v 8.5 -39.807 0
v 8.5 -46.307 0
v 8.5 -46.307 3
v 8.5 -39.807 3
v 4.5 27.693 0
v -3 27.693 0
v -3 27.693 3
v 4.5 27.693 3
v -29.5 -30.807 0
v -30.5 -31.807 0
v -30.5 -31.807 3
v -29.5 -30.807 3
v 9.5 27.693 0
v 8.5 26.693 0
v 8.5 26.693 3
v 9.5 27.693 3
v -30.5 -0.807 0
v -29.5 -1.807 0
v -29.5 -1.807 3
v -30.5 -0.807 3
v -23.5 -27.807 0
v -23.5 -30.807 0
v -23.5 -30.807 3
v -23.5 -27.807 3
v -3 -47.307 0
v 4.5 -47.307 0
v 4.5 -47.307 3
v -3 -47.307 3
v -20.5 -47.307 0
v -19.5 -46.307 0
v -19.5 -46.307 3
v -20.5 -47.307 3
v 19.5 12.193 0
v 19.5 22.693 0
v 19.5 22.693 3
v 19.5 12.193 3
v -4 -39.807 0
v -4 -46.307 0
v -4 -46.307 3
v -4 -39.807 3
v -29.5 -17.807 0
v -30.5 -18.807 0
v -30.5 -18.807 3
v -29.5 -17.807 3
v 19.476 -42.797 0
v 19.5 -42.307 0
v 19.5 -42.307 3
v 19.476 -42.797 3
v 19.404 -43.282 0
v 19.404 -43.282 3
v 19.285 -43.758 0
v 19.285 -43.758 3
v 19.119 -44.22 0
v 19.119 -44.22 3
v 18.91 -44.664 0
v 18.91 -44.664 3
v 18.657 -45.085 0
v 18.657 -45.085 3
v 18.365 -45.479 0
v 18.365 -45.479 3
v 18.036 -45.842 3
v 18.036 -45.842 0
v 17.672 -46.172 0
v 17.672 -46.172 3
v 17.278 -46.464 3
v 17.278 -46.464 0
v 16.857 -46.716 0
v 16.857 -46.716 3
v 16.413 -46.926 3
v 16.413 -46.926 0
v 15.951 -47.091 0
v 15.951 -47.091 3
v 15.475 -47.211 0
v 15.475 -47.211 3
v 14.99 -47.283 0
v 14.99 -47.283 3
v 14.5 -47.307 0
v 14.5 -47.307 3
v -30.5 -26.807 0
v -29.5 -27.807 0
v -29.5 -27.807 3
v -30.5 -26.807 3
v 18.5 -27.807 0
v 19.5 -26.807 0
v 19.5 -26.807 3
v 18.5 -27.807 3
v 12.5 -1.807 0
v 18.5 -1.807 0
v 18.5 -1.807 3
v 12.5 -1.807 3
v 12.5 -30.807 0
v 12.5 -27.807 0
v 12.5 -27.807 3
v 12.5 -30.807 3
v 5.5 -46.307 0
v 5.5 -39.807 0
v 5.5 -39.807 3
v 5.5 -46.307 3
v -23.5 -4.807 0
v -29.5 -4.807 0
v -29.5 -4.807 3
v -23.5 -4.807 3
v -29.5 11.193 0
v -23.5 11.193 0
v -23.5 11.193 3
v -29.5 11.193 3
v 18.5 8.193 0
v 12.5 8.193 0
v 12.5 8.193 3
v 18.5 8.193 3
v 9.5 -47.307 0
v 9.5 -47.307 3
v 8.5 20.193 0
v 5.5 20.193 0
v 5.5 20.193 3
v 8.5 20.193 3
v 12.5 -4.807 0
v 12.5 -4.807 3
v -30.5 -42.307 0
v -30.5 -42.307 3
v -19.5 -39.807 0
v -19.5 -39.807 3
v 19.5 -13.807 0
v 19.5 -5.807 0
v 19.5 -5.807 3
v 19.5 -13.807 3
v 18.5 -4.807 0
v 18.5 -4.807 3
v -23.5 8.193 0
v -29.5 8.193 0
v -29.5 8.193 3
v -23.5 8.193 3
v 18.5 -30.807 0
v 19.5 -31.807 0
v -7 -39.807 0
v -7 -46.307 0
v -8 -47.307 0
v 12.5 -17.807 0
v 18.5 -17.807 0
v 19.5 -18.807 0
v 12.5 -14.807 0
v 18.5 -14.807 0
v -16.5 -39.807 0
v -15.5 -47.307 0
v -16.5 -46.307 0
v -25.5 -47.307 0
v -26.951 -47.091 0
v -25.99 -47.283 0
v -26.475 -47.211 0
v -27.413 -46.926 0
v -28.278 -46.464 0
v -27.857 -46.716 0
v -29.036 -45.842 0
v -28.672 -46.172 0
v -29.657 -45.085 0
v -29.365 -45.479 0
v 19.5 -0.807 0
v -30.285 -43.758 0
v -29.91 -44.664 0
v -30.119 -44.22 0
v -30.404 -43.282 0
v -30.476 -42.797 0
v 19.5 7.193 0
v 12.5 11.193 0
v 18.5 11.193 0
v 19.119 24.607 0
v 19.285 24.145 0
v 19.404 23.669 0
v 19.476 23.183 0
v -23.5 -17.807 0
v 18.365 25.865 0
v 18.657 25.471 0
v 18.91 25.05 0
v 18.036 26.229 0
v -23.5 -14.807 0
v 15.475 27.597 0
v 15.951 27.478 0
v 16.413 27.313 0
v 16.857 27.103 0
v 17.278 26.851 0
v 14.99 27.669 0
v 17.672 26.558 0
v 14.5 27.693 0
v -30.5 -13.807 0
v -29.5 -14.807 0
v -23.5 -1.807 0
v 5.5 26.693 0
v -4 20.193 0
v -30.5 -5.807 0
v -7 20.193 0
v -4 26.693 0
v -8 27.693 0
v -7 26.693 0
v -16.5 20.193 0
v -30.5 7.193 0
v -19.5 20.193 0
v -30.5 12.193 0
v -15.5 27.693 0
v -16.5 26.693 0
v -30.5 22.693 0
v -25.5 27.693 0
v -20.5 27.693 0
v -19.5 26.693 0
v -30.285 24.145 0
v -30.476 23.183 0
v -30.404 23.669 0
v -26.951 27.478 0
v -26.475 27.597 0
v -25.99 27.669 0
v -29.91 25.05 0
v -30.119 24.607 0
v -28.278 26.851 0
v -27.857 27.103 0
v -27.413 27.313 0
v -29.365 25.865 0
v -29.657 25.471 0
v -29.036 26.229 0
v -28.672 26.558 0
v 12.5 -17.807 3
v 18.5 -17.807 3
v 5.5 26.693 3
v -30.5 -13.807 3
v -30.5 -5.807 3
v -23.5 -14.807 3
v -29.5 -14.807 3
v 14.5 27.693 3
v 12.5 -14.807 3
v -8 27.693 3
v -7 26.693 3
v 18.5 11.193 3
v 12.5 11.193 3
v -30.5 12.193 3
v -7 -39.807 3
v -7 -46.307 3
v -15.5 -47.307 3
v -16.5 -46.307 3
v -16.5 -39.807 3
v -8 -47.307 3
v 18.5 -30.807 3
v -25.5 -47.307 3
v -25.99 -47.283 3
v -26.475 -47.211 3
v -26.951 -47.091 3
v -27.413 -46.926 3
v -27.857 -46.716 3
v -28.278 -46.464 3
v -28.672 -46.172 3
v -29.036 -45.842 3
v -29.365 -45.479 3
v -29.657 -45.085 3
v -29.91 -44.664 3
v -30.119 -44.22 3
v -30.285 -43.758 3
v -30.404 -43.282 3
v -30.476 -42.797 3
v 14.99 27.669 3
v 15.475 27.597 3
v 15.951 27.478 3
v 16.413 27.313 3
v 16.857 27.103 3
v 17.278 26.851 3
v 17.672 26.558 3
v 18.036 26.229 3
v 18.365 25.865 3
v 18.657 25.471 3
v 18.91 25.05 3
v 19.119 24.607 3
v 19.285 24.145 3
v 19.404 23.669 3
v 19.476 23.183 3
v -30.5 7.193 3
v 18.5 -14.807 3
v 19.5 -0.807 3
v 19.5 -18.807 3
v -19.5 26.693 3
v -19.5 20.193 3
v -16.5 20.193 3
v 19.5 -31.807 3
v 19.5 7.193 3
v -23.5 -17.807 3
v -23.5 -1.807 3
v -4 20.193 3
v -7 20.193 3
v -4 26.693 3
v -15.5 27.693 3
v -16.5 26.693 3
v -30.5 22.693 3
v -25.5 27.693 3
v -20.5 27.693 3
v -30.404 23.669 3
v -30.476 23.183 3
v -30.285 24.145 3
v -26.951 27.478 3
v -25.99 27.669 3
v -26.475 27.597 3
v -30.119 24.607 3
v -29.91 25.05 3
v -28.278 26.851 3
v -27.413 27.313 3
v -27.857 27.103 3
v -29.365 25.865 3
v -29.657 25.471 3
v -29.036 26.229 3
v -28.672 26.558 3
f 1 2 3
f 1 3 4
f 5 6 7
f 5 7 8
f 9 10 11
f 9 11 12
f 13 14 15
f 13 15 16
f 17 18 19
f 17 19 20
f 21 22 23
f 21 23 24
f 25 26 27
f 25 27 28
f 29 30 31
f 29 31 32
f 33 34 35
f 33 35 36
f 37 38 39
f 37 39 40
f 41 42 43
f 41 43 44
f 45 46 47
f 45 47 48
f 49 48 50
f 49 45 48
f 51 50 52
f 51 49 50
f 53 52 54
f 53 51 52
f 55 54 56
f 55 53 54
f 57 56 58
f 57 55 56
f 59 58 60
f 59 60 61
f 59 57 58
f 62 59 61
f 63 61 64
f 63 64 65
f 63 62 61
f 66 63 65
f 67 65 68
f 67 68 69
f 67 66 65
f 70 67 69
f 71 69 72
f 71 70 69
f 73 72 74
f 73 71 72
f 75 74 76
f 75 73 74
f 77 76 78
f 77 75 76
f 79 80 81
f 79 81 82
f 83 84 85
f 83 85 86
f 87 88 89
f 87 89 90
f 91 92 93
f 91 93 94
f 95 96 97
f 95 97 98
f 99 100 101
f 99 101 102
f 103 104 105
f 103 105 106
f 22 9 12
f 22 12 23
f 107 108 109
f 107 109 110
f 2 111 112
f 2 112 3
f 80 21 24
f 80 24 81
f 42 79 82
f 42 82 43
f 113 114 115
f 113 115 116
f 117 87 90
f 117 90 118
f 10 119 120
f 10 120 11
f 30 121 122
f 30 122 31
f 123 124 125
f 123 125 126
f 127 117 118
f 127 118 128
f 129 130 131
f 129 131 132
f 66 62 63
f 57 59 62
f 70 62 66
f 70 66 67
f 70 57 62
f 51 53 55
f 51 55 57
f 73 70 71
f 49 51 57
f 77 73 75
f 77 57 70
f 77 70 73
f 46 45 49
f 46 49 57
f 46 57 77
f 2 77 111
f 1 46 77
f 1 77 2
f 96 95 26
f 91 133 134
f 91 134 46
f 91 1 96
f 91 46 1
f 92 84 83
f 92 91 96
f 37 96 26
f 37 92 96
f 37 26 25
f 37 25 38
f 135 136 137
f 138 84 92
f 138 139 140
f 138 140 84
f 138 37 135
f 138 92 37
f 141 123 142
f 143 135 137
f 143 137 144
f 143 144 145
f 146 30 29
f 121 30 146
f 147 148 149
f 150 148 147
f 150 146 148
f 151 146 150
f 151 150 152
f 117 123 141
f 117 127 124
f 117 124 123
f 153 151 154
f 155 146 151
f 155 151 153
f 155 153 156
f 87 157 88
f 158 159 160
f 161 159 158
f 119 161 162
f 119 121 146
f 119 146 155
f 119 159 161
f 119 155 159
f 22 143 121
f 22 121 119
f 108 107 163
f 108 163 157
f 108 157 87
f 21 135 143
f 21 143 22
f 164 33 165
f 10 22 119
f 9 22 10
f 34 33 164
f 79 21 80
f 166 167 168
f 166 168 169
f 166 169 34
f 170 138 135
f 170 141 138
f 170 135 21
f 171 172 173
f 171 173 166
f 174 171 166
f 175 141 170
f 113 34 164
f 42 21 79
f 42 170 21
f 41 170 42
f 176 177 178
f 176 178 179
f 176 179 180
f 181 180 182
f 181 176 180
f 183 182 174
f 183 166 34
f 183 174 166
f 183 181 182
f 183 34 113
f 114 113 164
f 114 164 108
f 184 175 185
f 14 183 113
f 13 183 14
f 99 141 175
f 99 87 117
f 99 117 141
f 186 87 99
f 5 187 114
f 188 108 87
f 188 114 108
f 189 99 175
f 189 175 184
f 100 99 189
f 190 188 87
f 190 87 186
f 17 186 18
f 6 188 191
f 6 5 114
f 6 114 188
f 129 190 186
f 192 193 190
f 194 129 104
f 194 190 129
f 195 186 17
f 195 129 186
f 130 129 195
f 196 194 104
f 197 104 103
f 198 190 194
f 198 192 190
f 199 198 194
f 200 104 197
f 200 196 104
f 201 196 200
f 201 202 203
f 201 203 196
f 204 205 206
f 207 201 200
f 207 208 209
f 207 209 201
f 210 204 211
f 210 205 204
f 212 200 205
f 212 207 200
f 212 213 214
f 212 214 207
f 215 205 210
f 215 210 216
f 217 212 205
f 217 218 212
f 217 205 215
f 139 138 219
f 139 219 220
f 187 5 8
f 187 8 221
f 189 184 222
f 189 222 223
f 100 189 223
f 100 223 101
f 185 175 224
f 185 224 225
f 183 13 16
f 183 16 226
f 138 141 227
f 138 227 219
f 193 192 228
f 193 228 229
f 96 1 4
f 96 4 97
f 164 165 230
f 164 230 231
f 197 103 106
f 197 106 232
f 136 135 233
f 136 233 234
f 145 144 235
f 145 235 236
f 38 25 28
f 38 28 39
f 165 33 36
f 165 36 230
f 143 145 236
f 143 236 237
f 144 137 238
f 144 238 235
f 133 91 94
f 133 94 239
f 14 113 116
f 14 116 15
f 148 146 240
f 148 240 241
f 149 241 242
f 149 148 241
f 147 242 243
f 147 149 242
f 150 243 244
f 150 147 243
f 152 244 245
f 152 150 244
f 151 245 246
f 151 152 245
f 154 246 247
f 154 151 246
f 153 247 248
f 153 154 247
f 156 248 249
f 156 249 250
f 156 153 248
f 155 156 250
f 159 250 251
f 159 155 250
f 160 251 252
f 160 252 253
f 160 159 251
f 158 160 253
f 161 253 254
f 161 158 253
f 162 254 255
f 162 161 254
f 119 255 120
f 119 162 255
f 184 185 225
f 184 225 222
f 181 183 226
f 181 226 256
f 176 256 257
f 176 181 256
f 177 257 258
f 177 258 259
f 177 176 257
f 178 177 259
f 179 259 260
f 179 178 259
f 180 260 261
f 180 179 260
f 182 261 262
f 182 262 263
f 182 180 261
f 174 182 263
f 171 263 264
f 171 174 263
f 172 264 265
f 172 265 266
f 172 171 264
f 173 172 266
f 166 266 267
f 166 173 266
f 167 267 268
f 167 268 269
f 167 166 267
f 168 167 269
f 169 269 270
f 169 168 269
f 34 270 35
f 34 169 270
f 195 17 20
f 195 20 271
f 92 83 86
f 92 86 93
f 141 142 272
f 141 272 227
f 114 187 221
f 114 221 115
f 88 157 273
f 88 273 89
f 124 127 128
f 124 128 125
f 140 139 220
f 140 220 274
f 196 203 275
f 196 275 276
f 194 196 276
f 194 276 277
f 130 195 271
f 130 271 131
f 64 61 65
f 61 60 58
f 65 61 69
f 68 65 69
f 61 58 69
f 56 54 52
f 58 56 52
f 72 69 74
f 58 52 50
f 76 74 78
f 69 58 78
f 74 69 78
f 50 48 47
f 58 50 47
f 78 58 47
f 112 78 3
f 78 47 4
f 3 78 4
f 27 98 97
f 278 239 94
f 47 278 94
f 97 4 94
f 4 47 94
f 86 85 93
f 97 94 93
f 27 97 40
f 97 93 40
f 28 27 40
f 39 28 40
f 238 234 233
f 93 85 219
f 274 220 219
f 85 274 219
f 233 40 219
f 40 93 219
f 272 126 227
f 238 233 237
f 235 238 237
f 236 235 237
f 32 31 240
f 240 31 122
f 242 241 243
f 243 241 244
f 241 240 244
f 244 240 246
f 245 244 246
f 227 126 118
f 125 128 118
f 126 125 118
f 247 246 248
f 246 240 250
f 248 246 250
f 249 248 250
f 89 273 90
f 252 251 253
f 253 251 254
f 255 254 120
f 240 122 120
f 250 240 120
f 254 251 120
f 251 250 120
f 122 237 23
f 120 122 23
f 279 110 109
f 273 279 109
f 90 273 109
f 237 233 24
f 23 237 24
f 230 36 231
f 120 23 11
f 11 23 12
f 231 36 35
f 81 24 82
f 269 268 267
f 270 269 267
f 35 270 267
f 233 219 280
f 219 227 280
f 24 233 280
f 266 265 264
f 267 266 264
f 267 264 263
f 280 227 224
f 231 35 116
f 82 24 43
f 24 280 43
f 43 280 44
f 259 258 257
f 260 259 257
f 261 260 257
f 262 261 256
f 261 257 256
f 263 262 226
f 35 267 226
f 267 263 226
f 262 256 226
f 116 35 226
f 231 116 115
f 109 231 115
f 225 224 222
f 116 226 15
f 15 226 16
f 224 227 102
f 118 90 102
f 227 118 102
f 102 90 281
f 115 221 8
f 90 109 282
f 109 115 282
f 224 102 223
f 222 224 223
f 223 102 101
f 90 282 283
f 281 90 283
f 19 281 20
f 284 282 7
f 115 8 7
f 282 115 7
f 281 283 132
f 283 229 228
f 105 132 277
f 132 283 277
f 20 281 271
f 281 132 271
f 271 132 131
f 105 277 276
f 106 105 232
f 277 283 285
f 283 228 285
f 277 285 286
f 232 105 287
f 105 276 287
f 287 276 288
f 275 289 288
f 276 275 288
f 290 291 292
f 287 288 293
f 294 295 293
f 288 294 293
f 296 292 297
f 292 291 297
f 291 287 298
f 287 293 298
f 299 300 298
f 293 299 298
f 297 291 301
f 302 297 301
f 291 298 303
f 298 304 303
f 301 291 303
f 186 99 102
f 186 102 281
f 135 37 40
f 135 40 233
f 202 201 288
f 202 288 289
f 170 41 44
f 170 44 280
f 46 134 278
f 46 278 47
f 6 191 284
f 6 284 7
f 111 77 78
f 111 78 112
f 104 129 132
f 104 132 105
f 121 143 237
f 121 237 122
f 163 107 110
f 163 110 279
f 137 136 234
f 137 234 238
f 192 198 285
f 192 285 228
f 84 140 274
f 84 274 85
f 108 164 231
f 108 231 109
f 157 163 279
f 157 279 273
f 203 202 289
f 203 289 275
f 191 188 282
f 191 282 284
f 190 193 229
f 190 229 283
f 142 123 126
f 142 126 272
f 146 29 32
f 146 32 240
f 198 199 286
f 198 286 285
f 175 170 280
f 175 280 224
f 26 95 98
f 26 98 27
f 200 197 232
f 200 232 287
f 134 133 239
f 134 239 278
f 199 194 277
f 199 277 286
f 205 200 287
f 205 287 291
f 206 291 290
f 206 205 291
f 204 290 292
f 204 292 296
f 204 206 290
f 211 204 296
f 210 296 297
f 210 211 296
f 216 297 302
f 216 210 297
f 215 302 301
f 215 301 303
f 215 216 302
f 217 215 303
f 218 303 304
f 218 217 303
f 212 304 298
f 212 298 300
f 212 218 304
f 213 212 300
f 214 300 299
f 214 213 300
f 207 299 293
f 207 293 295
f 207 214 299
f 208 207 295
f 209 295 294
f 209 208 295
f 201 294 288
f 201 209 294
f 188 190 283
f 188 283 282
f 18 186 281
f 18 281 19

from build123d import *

# Parameters (mm, degrees)
BOSS_EXTRUDE1_DEPTH = 3


with BuildPart() as part:
    # Sketch1 → Boss-Extrude1 (new body)
    with BuildSketch(Plane.XY):
        with BuildLine():
            Line((-15.5, 27.693204924), (-8, 27.693204924))
            Line((-8, 27.693204924), (-7, 26.693204924))
            Line((-7, 26.693204924), (-7, 20.193204924))
            Line((-7, 20.193204924), (-4, 20.193204924))
            Line((-4, 20.193204924), (-4, 26.693204924))
            Line((-4, 26.693204924), (-3, 27.693204924))
            Line((-3, 27.693204924), (4.5, 27.693204924))
            Line((4.5, 27.693204924), (5.5, 26.693204924))
            Line((5.5, 26.693204924), (5.5, 20.193204924))
            Line((5.5, 20.193204924), (8.5, 20.193204924))
            Line((8.5, 20.193204924), (8.5, 26.693204924))
            Line((8.5, 26.693204924), (9.5, 27.693204924))
            Line((9.5, 27.693204924), (14.5, 27.693204924))
            ThreePointArc((14.5, 27.693204924), (18.035533906, 26.22873883), (19.5, 22.693204924))
            Line((19.5, 22.693204924), (19.5, 12.193204924))
            Line((19.5, 12.193204924), (18.5, 11.193204924))
            Line((18.5, 11.193204924), (12.5, 11.193204924))
            Line((12.5, 11.193204924), (12.5, 8.193204924))
            Line((12.5, 8.193204924), (18.5, 8.193204924))
            Line((18.5, 8.193204924), (19.5, 7.193204924))
            Line((19.5, 7.193204924), (19.5, -0.806795076))
            Line((19.5, -0.806795076), (18.5, -1.806795076))
            Line((18.5, -1.806795076), (12.5, -1.806795076))
            Line((12.5, -1.806795076), (12.5, -4.806795076))
            Line((12.5, -4.806795076), (18.5, -4.806795076))
            Line((18.5, -4.806795076), (19.5, -5.806795076))
            Line((19.5, -5.806795076), (19.5, -13.806795076))
            Line((19.5, -13.806795076), (18.5, -14.806795076))
            Line((18.5, -14.806795076), (12.5, -14.806795076))
            Line((12.5, -14.806795076), (12.5, -17.806795076))
            Line((12.5, -17.806795076), (18.5, -17.806795076))
            Line((18.5, -17.806795076), (19.5, -18.806795076))
            Line((19.5, -18.806795076), (19.5, -26.806795076))
            Line((19.5, -26.806795076), (18.5, -27.806795076))
            Line((18.5, -27.806795076), (12.5, -27.806795076))
            Line((12.5, -27.806795076), (12.5, -30.806795076))
            Line((12.5, -30.806795076), (18.5, -30.806795076))
            Line((18.5, -30.806795076), (19.5, -31.806795076))
            Line((19.5, -31.806795076), (19.5, -42.306795076))
            ThreePointArc((19.5, -42.306795076), (18.035533906, -45.842328982), (14.5, -47.306795076))
            Line((14.5, -47.306795076), (9.5, -47.306795076))
            Line((9.5, -47.306795076), (8.5, -46.306795076))
            Line((8.5, -46.306795076), (8.5, -39.806795076))
            Line((8.5, -39.806795076), (5.5, -39.806795076))
            Line((5.5, -39.806795076), (5.5, -46.306795076))
            Line((5.5, -46.306795076), (4.5, -47.306795076))
            Line((4.5, -47.306795076), (-3, -47.306795076))
            Line((-3, -47.306795076), (-4, -46.306795076))
            Line((-4, -46.306795076), (-4, -39.806795076))
            Line((-4, -39.806795076), (-7, -39.806795076))
            Line((-7, -39.806795076), (-7, -46.306795076))
            Line((-7, -46.306795076), (-8, -47.306795076))
            Line((-8, -47.306795076), (-15.5, -47.306795076))
            Line((-15.5, -47.306795076), (-16.5, -46.306795076))
            Line((-16.5, -46.306795076), (-16.5, -39.806795076))
            Line((-16.5, -39.806795076), (-19.5, -39.806795076))
            Line((-19.5, -39.806795076), (-19.5, -46.306795076))
            Line((-19.5, -46.306795076), (-20.5, -47.306795076))
            Line((-20.5, -47.306795076), (-25.5, -47.306795076))
            ThreePointArc((-25.5, -47.306795076), (-29.035533906, -45.842328982), (-30.5, -42.306795076))
            Line((-30.5, -42.306795076), (-30.5, -31.806795076))
            Line((-30.5, -31.806795076), (-29.5, -30.806795076))
            Line((-29.5, -30.806795076), (-23.5, -30.806795076))
            Line((-23.5, -30.806795076), (-23.5, -27.806795076))
            Line((-23.5, -27.806795076), (-29.5, -27.806795076))
            Line((-29.5, -27.806795076), (-30.5, -26.806795076))
            Line((-30.5, -26.806795076), (-30.5, -18.806795076))
            Line((-30.5, -18.806795076), (-29.5, -17.806795076))
            Line((-29.5, -17.806795076), (-23.5, -17.806795076))
            Line((-23.5, -17.806795076), (-23.5, -14.806795076))
            Line((-23.5, -14.806795076), (-29.5, -14.806795076))
            Line((-29.5, -14.806795076), (-30.5, -13.806795076))
            Line((-30.5, -13.806795076), (-30.5, -5.806795076))
            Line((-30.5, -5.806795076), (-29.5, -4.806795076))
            Line((-29.5, -4.806795076), (-23.5, -4.806795076))
            Line((-23.5, -4.806795076), (-23.5, -1.806795076))
            Line((-23.5, -1.806795076), (-29.5, -1.806795076))
            Line((-29.5, -1.806795076), (-30.5, -0.806795076))
            Line((-30.5, -0.806795076), (-30.5, 7.193204924))
            Line((-30.5, 7.193204924), (-29.5, 8.193204924))
            Line((-29.5, 8.193204924), (-23.5, 8.193204924))
            Line((-23.5, 8.193204924), (-23.5, 11.193204924))
            Line((-23.5, 11.193204924), (-29.5, 11.193204924))
            Line((-29.5, 11.193204924), (-30.5, 12.193204924))
            Line((-30.5, 12.193204924), (-30.5, 22.693204924))
            ThreePointArc((-30.5, 22.693204924), (-29.035533906, 26.22873883), (-25.5, 27.693204924))
            Line((-25.5, 27.693204924), (-20.5, 27.693204924))
            Line((-20.5, 27.693204924), (-19.5, 26.693204924))
            Line((-19.5, 26.693204924), (-19.5, 20.193204924))
            Line((-19.5, 20.193204924), (-16.5, 20.193204924))
            Line((-16.5, 20.193204924), (-16.5, 26.693204924))
            Line((-16.5, 26.693204924), (-15.5, 27.693204924))
        make_face()
    extrude(amount=BOSS_EXTRUDE1_DEPTH)


solid = part.part
